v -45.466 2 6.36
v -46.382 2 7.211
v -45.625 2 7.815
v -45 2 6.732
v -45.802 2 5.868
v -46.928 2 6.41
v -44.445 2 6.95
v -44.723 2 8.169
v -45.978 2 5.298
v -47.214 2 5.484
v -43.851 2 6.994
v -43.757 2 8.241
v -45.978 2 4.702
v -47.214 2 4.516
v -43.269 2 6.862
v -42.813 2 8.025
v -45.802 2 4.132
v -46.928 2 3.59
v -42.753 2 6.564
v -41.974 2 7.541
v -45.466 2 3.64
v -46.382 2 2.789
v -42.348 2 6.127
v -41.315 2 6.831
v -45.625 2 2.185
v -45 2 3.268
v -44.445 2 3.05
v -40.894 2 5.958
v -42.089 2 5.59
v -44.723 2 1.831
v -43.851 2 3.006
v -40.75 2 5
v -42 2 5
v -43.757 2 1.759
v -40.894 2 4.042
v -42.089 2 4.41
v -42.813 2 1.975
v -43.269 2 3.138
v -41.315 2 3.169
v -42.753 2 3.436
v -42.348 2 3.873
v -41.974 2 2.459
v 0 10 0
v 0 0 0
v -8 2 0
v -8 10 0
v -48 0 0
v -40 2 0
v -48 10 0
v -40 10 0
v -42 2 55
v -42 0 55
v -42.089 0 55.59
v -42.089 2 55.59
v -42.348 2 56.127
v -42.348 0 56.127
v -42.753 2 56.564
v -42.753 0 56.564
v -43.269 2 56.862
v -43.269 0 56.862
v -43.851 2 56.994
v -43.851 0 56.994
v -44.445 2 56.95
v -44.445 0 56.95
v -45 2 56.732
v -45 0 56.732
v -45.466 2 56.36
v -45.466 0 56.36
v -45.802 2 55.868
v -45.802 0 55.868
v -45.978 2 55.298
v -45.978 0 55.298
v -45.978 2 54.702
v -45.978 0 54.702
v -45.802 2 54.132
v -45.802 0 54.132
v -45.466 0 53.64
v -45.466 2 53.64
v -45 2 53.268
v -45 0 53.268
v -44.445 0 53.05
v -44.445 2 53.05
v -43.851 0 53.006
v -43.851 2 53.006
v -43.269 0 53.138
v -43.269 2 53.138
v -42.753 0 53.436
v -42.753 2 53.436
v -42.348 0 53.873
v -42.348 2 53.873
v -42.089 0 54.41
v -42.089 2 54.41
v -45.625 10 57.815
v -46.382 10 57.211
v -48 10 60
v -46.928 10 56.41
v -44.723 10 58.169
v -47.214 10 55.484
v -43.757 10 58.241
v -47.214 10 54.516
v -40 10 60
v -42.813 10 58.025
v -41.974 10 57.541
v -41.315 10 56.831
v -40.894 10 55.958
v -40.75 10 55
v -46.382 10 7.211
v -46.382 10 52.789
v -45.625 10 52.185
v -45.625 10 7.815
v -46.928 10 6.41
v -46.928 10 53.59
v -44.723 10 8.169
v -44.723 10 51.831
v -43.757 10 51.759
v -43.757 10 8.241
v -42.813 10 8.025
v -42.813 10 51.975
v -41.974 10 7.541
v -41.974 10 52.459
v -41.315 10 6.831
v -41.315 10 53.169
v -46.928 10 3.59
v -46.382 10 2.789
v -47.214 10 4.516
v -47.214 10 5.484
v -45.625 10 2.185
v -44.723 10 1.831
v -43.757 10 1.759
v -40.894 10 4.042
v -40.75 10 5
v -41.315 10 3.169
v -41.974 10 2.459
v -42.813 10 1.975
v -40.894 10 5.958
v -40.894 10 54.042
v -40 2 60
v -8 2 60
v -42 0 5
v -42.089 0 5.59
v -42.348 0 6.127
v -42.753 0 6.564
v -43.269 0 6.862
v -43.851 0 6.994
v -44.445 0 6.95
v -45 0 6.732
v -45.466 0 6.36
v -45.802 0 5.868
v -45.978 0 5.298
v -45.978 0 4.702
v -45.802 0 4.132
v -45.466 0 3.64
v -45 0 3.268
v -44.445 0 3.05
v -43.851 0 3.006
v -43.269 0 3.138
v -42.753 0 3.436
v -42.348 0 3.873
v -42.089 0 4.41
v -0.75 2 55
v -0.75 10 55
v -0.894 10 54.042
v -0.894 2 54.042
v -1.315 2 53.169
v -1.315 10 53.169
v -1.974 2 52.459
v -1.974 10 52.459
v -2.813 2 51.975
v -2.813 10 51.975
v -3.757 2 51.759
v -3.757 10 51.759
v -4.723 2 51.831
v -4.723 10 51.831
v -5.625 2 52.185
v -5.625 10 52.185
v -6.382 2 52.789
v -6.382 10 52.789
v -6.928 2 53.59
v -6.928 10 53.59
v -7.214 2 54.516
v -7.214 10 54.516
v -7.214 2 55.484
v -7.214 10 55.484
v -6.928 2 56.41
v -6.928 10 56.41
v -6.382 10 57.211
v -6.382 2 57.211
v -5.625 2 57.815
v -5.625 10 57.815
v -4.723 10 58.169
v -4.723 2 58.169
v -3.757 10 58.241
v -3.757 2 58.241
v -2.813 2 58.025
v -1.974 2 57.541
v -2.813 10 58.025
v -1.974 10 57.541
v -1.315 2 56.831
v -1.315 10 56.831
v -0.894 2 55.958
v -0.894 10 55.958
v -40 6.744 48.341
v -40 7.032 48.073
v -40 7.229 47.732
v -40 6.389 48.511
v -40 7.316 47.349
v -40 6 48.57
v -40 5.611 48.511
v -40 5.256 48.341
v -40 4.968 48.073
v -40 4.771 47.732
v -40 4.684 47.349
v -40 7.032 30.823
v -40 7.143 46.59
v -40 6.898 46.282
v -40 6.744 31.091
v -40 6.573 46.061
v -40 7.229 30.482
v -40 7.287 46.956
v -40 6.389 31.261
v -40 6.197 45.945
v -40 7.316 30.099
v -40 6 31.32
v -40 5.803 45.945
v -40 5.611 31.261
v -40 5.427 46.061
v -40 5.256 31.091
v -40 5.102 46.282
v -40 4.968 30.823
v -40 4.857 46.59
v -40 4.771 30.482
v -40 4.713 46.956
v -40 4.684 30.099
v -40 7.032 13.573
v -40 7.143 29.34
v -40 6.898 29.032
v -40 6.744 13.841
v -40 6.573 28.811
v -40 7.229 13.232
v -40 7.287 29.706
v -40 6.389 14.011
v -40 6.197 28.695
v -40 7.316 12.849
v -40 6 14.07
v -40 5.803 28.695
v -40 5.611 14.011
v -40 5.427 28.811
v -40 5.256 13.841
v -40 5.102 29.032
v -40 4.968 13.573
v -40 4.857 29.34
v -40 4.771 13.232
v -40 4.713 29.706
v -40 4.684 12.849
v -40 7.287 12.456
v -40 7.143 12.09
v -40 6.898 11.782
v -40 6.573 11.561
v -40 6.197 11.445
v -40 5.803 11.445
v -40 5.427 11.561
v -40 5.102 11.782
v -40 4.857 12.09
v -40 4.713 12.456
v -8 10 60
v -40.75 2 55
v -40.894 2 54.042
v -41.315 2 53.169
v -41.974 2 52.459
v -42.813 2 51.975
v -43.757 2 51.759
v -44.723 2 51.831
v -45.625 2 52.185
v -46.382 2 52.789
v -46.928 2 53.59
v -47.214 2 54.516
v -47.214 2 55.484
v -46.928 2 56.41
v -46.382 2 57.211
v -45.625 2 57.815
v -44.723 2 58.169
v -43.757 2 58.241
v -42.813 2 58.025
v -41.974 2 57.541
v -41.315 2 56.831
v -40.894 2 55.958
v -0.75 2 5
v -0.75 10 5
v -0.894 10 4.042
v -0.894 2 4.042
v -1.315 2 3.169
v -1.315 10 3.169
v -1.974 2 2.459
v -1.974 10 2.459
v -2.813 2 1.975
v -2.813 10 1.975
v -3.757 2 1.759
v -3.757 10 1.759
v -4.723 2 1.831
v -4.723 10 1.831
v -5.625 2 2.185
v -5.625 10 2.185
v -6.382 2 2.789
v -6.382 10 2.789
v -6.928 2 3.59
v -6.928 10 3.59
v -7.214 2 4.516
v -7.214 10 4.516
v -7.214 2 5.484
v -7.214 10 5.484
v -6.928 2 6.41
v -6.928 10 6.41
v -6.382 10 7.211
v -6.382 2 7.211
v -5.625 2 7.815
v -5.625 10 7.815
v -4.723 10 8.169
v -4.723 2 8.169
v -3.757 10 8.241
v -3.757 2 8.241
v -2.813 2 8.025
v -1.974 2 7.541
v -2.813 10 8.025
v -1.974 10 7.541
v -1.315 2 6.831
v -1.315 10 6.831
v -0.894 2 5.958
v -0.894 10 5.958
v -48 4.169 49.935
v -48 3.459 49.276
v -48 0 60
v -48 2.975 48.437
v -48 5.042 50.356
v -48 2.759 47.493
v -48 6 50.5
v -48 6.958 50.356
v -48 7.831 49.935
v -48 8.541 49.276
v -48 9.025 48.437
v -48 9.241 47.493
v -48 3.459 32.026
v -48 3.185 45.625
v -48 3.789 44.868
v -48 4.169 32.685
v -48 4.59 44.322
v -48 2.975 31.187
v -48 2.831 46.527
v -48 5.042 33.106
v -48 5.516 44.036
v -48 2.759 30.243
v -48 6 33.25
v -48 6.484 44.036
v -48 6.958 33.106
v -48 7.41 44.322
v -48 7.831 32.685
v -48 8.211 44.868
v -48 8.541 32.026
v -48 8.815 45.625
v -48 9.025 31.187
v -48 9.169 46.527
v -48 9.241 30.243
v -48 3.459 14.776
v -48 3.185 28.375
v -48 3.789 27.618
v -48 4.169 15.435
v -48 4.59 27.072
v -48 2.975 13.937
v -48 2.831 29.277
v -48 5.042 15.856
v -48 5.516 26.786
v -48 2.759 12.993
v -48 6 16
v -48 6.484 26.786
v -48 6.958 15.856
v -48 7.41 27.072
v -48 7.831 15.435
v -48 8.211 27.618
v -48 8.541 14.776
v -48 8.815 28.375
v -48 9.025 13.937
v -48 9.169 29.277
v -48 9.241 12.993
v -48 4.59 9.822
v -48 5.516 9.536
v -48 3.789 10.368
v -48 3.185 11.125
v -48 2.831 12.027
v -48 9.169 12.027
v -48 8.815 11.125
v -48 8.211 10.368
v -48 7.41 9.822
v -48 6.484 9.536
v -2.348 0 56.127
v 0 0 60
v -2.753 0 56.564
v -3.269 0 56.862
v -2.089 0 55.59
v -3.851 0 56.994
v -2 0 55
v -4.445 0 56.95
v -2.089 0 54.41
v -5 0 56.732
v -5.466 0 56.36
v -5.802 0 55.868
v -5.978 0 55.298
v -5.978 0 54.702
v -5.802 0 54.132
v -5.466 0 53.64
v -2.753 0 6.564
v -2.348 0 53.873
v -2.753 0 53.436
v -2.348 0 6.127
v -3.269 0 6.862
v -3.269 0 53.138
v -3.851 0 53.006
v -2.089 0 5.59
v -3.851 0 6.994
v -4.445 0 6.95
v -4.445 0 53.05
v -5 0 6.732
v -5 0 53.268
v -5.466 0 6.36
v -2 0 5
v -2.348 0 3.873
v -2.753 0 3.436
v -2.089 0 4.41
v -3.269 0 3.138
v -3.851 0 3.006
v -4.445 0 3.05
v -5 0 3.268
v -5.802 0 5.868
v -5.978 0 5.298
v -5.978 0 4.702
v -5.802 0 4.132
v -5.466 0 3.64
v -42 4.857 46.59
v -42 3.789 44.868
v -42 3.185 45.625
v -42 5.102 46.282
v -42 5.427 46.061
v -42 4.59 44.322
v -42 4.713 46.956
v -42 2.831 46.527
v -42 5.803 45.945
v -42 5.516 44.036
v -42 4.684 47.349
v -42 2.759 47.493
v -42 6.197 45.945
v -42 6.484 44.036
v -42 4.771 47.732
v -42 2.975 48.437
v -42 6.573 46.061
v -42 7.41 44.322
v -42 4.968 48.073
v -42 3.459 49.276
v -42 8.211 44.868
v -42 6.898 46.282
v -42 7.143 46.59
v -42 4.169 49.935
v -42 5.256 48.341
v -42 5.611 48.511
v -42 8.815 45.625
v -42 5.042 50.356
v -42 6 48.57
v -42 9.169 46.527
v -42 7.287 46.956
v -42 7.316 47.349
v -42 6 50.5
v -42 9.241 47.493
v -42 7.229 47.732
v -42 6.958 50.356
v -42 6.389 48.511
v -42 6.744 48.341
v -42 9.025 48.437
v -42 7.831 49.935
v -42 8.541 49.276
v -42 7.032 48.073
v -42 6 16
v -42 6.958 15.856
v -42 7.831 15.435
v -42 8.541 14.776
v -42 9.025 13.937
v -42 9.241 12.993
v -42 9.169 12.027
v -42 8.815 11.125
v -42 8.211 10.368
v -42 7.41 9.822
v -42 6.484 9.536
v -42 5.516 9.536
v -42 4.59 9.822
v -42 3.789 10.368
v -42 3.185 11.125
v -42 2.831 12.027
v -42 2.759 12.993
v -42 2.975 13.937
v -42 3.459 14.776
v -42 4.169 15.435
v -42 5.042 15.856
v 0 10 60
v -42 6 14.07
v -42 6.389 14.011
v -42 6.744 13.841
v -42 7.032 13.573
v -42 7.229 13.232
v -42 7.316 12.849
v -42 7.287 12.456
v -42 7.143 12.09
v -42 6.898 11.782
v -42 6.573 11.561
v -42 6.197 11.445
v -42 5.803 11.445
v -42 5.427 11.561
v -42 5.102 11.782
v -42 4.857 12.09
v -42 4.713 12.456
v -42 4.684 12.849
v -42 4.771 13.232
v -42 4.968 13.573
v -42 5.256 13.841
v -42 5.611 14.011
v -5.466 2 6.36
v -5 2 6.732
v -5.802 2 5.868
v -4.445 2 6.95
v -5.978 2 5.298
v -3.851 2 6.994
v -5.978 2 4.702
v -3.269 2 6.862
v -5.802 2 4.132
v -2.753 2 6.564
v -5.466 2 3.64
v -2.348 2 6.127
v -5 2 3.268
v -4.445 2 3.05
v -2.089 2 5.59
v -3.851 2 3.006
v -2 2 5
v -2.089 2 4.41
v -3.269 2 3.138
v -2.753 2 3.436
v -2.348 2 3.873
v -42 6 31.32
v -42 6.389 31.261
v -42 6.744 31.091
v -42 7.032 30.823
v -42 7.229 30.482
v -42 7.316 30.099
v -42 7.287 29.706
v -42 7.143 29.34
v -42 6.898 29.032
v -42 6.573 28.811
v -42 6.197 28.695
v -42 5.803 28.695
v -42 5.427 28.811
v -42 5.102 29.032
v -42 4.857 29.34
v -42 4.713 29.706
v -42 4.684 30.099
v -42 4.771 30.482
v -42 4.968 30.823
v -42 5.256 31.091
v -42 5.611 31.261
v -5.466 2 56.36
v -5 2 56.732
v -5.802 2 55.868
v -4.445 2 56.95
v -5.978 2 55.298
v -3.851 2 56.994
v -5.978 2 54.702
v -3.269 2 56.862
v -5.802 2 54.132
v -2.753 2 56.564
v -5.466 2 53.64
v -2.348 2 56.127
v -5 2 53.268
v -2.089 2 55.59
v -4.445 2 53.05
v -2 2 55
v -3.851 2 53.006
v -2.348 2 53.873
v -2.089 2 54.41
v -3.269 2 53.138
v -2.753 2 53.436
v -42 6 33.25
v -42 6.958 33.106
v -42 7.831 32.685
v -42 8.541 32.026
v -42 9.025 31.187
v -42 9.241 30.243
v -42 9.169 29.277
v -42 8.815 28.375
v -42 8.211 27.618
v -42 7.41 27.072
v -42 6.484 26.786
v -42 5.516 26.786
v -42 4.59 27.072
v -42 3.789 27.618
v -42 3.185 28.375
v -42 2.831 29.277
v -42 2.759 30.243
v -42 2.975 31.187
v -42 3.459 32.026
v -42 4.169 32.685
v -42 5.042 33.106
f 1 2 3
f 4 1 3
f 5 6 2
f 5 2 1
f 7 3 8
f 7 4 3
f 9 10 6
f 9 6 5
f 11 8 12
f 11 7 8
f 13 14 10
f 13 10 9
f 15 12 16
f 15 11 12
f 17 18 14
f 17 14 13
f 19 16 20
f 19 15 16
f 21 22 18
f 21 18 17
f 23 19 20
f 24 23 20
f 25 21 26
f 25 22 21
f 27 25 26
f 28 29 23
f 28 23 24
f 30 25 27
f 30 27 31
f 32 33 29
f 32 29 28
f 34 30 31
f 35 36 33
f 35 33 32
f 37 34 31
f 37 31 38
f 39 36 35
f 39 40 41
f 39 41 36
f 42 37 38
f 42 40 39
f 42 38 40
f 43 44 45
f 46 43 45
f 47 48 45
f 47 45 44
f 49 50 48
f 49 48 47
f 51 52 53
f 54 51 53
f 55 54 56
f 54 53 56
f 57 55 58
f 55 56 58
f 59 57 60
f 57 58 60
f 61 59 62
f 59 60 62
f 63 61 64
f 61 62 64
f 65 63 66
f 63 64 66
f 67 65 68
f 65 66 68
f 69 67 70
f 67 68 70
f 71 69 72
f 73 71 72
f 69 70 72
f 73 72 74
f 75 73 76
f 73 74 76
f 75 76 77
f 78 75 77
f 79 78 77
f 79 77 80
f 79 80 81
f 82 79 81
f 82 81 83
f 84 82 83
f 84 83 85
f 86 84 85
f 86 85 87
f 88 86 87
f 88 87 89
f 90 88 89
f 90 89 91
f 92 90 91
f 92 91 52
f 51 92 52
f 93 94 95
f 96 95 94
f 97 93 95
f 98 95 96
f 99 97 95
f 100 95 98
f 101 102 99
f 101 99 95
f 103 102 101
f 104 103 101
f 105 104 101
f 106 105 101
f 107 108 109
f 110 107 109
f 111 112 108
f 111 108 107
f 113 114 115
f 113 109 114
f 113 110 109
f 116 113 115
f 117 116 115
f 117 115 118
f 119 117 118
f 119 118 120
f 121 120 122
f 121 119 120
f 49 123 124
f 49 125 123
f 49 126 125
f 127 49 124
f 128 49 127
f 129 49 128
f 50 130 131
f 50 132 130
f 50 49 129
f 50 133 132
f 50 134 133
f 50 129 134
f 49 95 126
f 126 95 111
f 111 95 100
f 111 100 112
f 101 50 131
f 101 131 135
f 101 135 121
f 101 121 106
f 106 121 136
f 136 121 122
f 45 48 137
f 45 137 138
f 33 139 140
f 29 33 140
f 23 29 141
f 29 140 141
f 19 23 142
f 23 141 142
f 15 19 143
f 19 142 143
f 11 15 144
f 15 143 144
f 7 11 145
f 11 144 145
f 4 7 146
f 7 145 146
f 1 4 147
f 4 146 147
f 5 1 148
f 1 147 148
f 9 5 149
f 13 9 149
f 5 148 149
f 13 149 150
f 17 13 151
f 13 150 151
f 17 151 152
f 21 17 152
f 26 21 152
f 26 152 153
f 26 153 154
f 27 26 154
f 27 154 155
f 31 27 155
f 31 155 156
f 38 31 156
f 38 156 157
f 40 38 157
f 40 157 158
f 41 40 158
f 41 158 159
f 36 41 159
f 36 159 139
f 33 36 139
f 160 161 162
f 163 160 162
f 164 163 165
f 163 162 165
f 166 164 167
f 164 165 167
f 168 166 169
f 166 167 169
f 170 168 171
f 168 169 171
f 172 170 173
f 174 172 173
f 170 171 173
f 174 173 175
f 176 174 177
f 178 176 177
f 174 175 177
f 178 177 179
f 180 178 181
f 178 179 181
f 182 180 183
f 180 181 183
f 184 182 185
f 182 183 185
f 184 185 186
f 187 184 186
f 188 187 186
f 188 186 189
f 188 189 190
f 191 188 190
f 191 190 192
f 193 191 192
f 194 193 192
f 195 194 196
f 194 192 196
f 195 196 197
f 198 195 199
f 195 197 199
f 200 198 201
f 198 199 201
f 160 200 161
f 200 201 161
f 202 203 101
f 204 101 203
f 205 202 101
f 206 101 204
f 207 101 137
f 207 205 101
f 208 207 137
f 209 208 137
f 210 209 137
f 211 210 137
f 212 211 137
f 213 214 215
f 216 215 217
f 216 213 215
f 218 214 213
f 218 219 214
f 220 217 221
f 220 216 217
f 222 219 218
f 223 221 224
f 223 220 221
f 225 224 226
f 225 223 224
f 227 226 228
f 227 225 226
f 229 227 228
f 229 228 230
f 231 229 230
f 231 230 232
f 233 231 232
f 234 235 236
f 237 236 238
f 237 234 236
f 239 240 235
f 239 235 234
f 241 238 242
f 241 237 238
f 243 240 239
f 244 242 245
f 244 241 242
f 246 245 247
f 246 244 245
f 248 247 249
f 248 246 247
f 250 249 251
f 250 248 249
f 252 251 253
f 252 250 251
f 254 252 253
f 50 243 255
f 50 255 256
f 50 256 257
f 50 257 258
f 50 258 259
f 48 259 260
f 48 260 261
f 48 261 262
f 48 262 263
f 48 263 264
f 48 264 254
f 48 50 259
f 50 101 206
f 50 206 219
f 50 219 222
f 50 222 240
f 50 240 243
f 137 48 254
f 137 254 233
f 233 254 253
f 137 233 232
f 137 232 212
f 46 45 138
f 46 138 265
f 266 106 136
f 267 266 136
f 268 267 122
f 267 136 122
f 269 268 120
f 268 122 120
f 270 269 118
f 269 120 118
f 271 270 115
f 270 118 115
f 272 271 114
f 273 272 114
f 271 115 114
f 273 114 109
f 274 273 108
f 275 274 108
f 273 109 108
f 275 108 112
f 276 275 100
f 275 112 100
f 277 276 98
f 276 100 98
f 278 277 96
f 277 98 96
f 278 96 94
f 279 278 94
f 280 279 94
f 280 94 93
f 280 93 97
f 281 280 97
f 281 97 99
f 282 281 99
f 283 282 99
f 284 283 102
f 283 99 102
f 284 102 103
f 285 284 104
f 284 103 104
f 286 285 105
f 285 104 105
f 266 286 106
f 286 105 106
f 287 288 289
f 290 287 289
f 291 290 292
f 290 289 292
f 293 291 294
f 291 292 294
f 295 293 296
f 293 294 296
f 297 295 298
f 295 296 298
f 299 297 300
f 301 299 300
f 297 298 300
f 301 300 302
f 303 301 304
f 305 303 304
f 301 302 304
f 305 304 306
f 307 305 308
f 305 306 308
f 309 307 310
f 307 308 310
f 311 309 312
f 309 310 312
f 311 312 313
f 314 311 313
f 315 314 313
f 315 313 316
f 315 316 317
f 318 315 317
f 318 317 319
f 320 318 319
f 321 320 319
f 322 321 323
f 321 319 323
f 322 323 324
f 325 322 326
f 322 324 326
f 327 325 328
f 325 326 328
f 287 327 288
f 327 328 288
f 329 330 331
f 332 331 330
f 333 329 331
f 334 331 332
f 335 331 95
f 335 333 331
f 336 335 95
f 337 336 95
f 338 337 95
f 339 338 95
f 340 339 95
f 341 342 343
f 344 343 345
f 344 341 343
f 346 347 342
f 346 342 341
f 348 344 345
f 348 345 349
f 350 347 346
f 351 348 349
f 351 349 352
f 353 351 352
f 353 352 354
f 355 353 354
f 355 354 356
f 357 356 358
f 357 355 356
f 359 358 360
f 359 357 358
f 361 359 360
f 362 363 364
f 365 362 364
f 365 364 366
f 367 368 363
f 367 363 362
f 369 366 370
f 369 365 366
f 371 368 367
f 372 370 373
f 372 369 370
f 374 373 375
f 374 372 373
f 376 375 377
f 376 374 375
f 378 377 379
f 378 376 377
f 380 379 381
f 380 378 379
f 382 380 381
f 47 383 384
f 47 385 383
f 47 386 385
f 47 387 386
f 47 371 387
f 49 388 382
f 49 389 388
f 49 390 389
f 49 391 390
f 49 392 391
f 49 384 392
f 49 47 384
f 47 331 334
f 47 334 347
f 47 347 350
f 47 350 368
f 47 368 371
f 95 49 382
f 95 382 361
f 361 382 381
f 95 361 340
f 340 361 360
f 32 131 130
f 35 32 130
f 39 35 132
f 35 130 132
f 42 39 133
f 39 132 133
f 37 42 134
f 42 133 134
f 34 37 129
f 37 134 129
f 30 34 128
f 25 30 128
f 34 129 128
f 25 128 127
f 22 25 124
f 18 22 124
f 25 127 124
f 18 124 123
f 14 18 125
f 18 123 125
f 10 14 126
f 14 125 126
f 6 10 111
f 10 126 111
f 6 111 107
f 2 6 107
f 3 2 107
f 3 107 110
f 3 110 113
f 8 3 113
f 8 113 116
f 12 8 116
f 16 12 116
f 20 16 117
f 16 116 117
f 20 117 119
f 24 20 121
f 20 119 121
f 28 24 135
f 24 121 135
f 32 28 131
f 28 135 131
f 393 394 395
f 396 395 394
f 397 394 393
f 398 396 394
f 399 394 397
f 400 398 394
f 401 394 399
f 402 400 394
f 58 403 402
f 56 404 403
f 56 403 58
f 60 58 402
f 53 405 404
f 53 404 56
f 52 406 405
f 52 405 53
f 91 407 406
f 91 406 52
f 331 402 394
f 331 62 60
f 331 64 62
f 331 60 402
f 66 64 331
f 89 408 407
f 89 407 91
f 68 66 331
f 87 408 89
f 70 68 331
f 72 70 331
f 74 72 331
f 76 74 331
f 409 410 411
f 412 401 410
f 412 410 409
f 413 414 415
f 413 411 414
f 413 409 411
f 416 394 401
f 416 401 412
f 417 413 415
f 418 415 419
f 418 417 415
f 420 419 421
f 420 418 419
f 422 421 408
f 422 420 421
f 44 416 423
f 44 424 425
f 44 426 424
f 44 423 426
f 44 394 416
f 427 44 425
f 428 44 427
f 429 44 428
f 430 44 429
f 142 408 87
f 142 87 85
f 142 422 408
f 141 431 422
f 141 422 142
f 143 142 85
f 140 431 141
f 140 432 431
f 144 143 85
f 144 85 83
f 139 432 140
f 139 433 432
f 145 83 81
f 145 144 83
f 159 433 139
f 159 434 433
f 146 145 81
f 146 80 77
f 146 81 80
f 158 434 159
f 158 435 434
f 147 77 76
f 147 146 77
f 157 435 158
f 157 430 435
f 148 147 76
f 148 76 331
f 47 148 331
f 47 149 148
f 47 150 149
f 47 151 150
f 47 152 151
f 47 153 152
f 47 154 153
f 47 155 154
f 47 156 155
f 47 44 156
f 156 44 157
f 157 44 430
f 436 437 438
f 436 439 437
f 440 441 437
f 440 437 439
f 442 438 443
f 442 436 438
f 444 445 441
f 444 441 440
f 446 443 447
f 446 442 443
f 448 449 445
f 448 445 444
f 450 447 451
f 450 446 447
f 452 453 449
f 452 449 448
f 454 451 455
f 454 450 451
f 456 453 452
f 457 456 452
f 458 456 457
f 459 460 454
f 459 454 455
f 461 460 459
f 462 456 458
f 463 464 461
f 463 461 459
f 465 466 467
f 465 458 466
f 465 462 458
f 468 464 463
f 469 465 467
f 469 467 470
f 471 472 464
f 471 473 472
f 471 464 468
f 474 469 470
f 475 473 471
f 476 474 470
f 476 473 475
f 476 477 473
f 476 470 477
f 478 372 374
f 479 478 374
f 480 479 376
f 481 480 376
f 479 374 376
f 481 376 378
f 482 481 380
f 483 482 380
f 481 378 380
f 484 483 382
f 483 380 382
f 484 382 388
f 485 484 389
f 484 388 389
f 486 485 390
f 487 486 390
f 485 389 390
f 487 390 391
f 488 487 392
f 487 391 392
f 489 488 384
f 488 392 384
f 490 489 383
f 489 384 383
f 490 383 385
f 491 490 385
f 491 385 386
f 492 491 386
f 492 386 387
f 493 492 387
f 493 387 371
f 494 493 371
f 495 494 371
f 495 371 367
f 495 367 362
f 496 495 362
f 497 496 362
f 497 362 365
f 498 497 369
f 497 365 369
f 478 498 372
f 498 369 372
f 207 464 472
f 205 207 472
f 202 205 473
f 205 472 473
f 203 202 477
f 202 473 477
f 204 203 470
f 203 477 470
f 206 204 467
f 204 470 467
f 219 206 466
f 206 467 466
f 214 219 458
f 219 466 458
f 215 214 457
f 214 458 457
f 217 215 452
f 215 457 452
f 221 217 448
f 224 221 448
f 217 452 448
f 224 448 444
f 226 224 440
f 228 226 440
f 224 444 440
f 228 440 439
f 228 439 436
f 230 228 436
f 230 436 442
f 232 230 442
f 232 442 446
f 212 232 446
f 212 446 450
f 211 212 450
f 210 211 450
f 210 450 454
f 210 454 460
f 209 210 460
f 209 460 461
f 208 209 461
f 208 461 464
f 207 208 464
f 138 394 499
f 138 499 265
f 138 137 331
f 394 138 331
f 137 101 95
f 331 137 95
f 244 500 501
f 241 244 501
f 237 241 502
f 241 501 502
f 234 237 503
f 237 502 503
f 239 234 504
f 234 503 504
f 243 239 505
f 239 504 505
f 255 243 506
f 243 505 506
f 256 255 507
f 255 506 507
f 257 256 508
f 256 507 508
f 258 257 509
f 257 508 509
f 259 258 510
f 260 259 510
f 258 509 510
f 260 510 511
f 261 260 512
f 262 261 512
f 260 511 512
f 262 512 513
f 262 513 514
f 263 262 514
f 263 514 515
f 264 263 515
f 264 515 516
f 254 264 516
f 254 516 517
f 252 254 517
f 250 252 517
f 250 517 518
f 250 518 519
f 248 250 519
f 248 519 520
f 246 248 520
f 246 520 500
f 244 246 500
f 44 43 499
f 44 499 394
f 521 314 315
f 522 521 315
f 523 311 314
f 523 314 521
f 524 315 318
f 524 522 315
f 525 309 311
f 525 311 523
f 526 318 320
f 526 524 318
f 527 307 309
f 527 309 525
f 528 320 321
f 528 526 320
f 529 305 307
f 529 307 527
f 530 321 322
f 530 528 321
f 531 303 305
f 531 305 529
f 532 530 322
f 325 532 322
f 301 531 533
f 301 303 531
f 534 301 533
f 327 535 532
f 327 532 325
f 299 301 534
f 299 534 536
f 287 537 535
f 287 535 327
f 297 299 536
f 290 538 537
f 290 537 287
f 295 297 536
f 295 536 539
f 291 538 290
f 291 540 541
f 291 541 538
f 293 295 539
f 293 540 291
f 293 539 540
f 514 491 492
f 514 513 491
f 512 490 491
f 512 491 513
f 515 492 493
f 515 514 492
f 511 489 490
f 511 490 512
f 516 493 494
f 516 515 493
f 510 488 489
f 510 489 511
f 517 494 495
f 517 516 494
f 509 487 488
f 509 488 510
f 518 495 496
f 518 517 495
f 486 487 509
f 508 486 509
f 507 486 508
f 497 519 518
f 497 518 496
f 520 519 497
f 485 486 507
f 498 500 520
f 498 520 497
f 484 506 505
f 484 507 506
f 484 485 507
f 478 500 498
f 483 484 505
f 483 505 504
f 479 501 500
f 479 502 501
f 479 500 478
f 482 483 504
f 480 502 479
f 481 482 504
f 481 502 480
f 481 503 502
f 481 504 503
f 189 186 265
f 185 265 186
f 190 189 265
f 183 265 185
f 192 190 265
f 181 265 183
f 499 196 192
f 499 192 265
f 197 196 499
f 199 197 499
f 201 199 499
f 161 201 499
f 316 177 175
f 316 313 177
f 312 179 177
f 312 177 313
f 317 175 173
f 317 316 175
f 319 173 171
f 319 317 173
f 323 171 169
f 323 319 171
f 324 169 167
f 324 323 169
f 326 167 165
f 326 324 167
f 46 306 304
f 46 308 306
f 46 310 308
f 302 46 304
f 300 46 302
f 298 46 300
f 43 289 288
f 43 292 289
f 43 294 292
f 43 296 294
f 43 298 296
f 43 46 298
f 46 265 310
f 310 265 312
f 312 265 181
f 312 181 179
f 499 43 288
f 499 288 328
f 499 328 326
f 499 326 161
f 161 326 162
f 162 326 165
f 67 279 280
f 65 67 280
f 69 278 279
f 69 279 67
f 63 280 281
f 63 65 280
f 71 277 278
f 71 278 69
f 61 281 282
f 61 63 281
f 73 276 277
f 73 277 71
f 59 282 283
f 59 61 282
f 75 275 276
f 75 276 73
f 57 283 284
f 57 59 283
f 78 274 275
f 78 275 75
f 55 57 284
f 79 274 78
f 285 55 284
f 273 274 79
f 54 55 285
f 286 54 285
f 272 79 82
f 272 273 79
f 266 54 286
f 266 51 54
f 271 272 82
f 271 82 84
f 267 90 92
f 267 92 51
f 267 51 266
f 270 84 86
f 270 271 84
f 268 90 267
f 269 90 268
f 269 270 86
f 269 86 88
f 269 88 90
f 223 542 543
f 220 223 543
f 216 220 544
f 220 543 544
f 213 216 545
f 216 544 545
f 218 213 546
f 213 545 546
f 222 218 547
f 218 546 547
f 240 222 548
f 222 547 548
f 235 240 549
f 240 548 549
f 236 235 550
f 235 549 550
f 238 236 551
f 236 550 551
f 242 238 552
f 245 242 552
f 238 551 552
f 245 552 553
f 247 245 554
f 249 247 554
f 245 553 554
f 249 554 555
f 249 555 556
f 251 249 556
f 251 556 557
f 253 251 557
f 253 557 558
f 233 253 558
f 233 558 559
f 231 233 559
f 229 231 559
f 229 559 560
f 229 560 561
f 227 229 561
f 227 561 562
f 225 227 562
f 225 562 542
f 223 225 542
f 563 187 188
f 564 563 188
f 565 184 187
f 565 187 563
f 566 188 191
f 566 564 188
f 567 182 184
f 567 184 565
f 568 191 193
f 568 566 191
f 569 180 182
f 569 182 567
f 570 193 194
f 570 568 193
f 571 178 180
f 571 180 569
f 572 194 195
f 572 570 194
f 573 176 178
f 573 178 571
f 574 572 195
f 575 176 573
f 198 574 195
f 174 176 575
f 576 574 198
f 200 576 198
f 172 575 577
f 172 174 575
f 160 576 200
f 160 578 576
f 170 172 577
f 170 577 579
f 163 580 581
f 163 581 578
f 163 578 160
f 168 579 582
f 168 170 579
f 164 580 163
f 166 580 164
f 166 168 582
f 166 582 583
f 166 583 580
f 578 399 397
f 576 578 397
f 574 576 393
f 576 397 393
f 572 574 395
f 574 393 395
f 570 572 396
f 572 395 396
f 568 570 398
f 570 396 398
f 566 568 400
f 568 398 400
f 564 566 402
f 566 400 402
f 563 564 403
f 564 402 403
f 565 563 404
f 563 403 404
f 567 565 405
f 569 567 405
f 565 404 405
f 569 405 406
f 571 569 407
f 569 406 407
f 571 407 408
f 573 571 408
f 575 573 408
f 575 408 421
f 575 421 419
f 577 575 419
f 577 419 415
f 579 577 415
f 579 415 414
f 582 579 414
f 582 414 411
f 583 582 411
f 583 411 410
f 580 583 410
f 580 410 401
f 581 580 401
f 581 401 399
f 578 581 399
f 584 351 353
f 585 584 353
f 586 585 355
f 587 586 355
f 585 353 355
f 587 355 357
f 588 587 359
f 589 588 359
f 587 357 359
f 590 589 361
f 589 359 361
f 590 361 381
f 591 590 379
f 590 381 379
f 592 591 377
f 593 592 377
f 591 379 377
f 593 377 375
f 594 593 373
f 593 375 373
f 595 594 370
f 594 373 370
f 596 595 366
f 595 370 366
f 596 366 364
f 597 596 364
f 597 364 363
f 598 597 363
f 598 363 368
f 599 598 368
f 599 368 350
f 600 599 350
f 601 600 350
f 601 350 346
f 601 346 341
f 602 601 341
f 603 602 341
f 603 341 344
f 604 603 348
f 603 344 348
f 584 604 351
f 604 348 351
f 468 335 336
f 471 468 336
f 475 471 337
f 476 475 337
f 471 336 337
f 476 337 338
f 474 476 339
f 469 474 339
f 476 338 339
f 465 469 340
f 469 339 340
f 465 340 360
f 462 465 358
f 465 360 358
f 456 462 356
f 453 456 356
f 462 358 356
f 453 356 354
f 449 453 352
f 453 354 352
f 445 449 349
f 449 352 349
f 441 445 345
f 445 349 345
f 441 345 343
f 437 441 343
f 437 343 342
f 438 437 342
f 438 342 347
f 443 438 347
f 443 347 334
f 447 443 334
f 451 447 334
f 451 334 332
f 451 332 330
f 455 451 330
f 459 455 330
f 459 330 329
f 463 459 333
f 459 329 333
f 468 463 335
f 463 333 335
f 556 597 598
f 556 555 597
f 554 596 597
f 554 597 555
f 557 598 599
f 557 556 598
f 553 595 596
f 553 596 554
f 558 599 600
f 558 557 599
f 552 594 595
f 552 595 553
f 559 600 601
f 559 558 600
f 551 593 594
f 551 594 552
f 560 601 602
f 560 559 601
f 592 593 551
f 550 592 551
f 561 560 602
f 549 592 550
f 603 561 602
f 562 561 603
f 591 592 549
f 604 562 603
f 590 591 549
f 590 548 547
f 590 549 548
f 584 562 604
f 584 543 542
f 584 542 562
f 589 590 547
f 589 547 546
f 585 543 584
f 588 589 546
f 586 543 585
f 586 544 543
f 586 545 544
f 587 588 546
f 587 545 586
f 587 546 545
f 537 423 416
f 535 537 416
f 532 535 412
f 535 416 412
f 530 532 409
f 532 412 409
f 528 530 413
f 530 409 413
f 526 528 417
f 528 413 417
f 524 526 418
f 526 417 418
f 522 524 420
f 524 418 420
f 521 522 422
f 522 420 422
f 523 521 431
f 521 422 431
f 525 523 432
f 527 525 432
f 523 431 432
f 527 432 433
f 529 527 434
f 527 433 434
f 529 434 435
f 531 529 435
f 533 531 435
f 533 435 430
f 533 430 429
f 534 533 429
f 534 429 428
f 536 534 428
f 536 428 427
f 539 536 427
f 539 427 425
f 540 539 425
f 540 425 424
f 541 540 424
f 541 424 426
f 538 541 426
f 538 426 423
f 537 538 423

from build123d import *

# Parameters (mm, degrees)
BOSS_EXTRUDE1_DEPTH = 60
SKETCH3_R           = 3.25
CUT_EXTRUDE1_DEPTH  = 8
SKETCH4_R           = 2
CUT_EXTRUDE2_DEPTH  = 8
CUT_EXTRUDE3_REACH  = 50
SKETCH5_R           = 1.32
SKETCH6_R           = 3.25
CUT_EXTRUDE4_DEPTH  = 6


with BuildPart() as part:
    # Sketch1 → Boss-Extrude1 (new body)
    with BuildSketch(Plane.XY):
        Polygon((-48, 0), (-48, 10), (-40, 10), (-40, 2), (-8, 2), (-8, 10), (0, 10), (0, 0), align=None)
    extrude(amount=BOSS_EXTRUDE1_DEPTH)

    # Sketch3 → Cut-Extrude1 (cut)
    with BuildSketch(Plane(origin=(0, 10, 0), x_dir=(1, 0, 0), z_dir=(0, 1, 0))):
        with Locations((-44, -5)):
            Circle(SKETCH3_R)
        with Locations((-4, -5)):
            Circle(SKETCH3_R)
        with Locations((-4, -55)):
            Circle(SKETCH3_R)
        with Locations((-44, -55)):
            Circle(SKETCH3_R)
    extrude(amount=-CUT_EXTRUDE1_DEPTH, mode=Mode.SUBTRACT)

    # Sketch4 → Cut-Extrude2 (cut)
    with BuildSketch(Plane.XZ):
        with Locations((-44, 55)):
            Circle(SKETCH4_R)
        with Locations((-4, 55)):
            Circle(SKETCH4_R)
        with Locations((-4, 5)):
            Circle(SKETCH4_R)
        with Locations((-44, 5)):
            Circle(SKETCH4_R)
    extrude(amount=-CUT_EXTRUDE2_DEPTH, mode=Mode.SUBTRACT)

    # Sketch5 → Cut-Extrude3 (cut, up to next)
    with BuildSketch(Plane.ZY.offset(48), mode=Mode.PRIVATE) as cut_extrude3_sk1:
        with Locations((12.75, 6)):
            Circle(SKETCH5_R)
    cut_extrude3_tool1 = extrude(cut_extrude3_sk1.sketch, amount=-CUT_EXTRUDE3_REACH, mode=Mode.PRIVATE) & part.part
    add(cut_extrude3_tool1.solids().sort_by_distance((-48, 6, 12.75))[0], mode=Mode.SUBTRACT)
    # Sketch5 → Cut-Extrude3 (cut, up to next)
    with BuildSketch(Plane.ZY.offset(48), mode=Mode.PRIVATE) as cut_extrude3_sk2:
        with Locations((30, 6)):
            Circle(SKETCH5_R)
    cut_extrude3_tool2 = extrude(cut_extrude3_sk2.sketch, amount=-CUT_EXTRUDE3_REACH, mode=Mode.PRIVATE) & part.part
    add(cut_extrude3_tool2.solids().sort_by_distance((-48, 6, 30))[0], mode=Mode.SUBTRACT)
    # Sketch5 → Cut-Extrude3 (cut, up to next)
    with BuildSketch(Plane.ZY.offset(48), mode=Mode.PRIVATE) as cut_extrude3_sk3:
        with Locations((47.25, 6)):
            Circle(SKETCH5_R)
    cut_extrude3_tool3 = extrude(cut_extrude3_sk3.sketch, amount=-CUT_EXTRUDE3_REACH, mode=Mode.PRIVATE) & part.part
    add(cut_extrude3_tool3.solids().sort_by_distance((-48, 6, 47.25))[0], mode=Mode.SUBTRACT)

    # Sketch6 → Cut-Extrude4 (cut)
    with BuildSketch(Plane.ZY.offset(48)):
        with Locations((12.75, 6)):
            Circle(SKETCH6_R)
        with Locations((30, 6)):
            Circle(SKETCH6_R)
        with Locations((47.25, 6)):
            Circle(SKETCH6_R)
    extrude(amount=-CUT_EXTRUDE4_DEPTH, mode=Mode.SUBTRACT)


solid = part.part
